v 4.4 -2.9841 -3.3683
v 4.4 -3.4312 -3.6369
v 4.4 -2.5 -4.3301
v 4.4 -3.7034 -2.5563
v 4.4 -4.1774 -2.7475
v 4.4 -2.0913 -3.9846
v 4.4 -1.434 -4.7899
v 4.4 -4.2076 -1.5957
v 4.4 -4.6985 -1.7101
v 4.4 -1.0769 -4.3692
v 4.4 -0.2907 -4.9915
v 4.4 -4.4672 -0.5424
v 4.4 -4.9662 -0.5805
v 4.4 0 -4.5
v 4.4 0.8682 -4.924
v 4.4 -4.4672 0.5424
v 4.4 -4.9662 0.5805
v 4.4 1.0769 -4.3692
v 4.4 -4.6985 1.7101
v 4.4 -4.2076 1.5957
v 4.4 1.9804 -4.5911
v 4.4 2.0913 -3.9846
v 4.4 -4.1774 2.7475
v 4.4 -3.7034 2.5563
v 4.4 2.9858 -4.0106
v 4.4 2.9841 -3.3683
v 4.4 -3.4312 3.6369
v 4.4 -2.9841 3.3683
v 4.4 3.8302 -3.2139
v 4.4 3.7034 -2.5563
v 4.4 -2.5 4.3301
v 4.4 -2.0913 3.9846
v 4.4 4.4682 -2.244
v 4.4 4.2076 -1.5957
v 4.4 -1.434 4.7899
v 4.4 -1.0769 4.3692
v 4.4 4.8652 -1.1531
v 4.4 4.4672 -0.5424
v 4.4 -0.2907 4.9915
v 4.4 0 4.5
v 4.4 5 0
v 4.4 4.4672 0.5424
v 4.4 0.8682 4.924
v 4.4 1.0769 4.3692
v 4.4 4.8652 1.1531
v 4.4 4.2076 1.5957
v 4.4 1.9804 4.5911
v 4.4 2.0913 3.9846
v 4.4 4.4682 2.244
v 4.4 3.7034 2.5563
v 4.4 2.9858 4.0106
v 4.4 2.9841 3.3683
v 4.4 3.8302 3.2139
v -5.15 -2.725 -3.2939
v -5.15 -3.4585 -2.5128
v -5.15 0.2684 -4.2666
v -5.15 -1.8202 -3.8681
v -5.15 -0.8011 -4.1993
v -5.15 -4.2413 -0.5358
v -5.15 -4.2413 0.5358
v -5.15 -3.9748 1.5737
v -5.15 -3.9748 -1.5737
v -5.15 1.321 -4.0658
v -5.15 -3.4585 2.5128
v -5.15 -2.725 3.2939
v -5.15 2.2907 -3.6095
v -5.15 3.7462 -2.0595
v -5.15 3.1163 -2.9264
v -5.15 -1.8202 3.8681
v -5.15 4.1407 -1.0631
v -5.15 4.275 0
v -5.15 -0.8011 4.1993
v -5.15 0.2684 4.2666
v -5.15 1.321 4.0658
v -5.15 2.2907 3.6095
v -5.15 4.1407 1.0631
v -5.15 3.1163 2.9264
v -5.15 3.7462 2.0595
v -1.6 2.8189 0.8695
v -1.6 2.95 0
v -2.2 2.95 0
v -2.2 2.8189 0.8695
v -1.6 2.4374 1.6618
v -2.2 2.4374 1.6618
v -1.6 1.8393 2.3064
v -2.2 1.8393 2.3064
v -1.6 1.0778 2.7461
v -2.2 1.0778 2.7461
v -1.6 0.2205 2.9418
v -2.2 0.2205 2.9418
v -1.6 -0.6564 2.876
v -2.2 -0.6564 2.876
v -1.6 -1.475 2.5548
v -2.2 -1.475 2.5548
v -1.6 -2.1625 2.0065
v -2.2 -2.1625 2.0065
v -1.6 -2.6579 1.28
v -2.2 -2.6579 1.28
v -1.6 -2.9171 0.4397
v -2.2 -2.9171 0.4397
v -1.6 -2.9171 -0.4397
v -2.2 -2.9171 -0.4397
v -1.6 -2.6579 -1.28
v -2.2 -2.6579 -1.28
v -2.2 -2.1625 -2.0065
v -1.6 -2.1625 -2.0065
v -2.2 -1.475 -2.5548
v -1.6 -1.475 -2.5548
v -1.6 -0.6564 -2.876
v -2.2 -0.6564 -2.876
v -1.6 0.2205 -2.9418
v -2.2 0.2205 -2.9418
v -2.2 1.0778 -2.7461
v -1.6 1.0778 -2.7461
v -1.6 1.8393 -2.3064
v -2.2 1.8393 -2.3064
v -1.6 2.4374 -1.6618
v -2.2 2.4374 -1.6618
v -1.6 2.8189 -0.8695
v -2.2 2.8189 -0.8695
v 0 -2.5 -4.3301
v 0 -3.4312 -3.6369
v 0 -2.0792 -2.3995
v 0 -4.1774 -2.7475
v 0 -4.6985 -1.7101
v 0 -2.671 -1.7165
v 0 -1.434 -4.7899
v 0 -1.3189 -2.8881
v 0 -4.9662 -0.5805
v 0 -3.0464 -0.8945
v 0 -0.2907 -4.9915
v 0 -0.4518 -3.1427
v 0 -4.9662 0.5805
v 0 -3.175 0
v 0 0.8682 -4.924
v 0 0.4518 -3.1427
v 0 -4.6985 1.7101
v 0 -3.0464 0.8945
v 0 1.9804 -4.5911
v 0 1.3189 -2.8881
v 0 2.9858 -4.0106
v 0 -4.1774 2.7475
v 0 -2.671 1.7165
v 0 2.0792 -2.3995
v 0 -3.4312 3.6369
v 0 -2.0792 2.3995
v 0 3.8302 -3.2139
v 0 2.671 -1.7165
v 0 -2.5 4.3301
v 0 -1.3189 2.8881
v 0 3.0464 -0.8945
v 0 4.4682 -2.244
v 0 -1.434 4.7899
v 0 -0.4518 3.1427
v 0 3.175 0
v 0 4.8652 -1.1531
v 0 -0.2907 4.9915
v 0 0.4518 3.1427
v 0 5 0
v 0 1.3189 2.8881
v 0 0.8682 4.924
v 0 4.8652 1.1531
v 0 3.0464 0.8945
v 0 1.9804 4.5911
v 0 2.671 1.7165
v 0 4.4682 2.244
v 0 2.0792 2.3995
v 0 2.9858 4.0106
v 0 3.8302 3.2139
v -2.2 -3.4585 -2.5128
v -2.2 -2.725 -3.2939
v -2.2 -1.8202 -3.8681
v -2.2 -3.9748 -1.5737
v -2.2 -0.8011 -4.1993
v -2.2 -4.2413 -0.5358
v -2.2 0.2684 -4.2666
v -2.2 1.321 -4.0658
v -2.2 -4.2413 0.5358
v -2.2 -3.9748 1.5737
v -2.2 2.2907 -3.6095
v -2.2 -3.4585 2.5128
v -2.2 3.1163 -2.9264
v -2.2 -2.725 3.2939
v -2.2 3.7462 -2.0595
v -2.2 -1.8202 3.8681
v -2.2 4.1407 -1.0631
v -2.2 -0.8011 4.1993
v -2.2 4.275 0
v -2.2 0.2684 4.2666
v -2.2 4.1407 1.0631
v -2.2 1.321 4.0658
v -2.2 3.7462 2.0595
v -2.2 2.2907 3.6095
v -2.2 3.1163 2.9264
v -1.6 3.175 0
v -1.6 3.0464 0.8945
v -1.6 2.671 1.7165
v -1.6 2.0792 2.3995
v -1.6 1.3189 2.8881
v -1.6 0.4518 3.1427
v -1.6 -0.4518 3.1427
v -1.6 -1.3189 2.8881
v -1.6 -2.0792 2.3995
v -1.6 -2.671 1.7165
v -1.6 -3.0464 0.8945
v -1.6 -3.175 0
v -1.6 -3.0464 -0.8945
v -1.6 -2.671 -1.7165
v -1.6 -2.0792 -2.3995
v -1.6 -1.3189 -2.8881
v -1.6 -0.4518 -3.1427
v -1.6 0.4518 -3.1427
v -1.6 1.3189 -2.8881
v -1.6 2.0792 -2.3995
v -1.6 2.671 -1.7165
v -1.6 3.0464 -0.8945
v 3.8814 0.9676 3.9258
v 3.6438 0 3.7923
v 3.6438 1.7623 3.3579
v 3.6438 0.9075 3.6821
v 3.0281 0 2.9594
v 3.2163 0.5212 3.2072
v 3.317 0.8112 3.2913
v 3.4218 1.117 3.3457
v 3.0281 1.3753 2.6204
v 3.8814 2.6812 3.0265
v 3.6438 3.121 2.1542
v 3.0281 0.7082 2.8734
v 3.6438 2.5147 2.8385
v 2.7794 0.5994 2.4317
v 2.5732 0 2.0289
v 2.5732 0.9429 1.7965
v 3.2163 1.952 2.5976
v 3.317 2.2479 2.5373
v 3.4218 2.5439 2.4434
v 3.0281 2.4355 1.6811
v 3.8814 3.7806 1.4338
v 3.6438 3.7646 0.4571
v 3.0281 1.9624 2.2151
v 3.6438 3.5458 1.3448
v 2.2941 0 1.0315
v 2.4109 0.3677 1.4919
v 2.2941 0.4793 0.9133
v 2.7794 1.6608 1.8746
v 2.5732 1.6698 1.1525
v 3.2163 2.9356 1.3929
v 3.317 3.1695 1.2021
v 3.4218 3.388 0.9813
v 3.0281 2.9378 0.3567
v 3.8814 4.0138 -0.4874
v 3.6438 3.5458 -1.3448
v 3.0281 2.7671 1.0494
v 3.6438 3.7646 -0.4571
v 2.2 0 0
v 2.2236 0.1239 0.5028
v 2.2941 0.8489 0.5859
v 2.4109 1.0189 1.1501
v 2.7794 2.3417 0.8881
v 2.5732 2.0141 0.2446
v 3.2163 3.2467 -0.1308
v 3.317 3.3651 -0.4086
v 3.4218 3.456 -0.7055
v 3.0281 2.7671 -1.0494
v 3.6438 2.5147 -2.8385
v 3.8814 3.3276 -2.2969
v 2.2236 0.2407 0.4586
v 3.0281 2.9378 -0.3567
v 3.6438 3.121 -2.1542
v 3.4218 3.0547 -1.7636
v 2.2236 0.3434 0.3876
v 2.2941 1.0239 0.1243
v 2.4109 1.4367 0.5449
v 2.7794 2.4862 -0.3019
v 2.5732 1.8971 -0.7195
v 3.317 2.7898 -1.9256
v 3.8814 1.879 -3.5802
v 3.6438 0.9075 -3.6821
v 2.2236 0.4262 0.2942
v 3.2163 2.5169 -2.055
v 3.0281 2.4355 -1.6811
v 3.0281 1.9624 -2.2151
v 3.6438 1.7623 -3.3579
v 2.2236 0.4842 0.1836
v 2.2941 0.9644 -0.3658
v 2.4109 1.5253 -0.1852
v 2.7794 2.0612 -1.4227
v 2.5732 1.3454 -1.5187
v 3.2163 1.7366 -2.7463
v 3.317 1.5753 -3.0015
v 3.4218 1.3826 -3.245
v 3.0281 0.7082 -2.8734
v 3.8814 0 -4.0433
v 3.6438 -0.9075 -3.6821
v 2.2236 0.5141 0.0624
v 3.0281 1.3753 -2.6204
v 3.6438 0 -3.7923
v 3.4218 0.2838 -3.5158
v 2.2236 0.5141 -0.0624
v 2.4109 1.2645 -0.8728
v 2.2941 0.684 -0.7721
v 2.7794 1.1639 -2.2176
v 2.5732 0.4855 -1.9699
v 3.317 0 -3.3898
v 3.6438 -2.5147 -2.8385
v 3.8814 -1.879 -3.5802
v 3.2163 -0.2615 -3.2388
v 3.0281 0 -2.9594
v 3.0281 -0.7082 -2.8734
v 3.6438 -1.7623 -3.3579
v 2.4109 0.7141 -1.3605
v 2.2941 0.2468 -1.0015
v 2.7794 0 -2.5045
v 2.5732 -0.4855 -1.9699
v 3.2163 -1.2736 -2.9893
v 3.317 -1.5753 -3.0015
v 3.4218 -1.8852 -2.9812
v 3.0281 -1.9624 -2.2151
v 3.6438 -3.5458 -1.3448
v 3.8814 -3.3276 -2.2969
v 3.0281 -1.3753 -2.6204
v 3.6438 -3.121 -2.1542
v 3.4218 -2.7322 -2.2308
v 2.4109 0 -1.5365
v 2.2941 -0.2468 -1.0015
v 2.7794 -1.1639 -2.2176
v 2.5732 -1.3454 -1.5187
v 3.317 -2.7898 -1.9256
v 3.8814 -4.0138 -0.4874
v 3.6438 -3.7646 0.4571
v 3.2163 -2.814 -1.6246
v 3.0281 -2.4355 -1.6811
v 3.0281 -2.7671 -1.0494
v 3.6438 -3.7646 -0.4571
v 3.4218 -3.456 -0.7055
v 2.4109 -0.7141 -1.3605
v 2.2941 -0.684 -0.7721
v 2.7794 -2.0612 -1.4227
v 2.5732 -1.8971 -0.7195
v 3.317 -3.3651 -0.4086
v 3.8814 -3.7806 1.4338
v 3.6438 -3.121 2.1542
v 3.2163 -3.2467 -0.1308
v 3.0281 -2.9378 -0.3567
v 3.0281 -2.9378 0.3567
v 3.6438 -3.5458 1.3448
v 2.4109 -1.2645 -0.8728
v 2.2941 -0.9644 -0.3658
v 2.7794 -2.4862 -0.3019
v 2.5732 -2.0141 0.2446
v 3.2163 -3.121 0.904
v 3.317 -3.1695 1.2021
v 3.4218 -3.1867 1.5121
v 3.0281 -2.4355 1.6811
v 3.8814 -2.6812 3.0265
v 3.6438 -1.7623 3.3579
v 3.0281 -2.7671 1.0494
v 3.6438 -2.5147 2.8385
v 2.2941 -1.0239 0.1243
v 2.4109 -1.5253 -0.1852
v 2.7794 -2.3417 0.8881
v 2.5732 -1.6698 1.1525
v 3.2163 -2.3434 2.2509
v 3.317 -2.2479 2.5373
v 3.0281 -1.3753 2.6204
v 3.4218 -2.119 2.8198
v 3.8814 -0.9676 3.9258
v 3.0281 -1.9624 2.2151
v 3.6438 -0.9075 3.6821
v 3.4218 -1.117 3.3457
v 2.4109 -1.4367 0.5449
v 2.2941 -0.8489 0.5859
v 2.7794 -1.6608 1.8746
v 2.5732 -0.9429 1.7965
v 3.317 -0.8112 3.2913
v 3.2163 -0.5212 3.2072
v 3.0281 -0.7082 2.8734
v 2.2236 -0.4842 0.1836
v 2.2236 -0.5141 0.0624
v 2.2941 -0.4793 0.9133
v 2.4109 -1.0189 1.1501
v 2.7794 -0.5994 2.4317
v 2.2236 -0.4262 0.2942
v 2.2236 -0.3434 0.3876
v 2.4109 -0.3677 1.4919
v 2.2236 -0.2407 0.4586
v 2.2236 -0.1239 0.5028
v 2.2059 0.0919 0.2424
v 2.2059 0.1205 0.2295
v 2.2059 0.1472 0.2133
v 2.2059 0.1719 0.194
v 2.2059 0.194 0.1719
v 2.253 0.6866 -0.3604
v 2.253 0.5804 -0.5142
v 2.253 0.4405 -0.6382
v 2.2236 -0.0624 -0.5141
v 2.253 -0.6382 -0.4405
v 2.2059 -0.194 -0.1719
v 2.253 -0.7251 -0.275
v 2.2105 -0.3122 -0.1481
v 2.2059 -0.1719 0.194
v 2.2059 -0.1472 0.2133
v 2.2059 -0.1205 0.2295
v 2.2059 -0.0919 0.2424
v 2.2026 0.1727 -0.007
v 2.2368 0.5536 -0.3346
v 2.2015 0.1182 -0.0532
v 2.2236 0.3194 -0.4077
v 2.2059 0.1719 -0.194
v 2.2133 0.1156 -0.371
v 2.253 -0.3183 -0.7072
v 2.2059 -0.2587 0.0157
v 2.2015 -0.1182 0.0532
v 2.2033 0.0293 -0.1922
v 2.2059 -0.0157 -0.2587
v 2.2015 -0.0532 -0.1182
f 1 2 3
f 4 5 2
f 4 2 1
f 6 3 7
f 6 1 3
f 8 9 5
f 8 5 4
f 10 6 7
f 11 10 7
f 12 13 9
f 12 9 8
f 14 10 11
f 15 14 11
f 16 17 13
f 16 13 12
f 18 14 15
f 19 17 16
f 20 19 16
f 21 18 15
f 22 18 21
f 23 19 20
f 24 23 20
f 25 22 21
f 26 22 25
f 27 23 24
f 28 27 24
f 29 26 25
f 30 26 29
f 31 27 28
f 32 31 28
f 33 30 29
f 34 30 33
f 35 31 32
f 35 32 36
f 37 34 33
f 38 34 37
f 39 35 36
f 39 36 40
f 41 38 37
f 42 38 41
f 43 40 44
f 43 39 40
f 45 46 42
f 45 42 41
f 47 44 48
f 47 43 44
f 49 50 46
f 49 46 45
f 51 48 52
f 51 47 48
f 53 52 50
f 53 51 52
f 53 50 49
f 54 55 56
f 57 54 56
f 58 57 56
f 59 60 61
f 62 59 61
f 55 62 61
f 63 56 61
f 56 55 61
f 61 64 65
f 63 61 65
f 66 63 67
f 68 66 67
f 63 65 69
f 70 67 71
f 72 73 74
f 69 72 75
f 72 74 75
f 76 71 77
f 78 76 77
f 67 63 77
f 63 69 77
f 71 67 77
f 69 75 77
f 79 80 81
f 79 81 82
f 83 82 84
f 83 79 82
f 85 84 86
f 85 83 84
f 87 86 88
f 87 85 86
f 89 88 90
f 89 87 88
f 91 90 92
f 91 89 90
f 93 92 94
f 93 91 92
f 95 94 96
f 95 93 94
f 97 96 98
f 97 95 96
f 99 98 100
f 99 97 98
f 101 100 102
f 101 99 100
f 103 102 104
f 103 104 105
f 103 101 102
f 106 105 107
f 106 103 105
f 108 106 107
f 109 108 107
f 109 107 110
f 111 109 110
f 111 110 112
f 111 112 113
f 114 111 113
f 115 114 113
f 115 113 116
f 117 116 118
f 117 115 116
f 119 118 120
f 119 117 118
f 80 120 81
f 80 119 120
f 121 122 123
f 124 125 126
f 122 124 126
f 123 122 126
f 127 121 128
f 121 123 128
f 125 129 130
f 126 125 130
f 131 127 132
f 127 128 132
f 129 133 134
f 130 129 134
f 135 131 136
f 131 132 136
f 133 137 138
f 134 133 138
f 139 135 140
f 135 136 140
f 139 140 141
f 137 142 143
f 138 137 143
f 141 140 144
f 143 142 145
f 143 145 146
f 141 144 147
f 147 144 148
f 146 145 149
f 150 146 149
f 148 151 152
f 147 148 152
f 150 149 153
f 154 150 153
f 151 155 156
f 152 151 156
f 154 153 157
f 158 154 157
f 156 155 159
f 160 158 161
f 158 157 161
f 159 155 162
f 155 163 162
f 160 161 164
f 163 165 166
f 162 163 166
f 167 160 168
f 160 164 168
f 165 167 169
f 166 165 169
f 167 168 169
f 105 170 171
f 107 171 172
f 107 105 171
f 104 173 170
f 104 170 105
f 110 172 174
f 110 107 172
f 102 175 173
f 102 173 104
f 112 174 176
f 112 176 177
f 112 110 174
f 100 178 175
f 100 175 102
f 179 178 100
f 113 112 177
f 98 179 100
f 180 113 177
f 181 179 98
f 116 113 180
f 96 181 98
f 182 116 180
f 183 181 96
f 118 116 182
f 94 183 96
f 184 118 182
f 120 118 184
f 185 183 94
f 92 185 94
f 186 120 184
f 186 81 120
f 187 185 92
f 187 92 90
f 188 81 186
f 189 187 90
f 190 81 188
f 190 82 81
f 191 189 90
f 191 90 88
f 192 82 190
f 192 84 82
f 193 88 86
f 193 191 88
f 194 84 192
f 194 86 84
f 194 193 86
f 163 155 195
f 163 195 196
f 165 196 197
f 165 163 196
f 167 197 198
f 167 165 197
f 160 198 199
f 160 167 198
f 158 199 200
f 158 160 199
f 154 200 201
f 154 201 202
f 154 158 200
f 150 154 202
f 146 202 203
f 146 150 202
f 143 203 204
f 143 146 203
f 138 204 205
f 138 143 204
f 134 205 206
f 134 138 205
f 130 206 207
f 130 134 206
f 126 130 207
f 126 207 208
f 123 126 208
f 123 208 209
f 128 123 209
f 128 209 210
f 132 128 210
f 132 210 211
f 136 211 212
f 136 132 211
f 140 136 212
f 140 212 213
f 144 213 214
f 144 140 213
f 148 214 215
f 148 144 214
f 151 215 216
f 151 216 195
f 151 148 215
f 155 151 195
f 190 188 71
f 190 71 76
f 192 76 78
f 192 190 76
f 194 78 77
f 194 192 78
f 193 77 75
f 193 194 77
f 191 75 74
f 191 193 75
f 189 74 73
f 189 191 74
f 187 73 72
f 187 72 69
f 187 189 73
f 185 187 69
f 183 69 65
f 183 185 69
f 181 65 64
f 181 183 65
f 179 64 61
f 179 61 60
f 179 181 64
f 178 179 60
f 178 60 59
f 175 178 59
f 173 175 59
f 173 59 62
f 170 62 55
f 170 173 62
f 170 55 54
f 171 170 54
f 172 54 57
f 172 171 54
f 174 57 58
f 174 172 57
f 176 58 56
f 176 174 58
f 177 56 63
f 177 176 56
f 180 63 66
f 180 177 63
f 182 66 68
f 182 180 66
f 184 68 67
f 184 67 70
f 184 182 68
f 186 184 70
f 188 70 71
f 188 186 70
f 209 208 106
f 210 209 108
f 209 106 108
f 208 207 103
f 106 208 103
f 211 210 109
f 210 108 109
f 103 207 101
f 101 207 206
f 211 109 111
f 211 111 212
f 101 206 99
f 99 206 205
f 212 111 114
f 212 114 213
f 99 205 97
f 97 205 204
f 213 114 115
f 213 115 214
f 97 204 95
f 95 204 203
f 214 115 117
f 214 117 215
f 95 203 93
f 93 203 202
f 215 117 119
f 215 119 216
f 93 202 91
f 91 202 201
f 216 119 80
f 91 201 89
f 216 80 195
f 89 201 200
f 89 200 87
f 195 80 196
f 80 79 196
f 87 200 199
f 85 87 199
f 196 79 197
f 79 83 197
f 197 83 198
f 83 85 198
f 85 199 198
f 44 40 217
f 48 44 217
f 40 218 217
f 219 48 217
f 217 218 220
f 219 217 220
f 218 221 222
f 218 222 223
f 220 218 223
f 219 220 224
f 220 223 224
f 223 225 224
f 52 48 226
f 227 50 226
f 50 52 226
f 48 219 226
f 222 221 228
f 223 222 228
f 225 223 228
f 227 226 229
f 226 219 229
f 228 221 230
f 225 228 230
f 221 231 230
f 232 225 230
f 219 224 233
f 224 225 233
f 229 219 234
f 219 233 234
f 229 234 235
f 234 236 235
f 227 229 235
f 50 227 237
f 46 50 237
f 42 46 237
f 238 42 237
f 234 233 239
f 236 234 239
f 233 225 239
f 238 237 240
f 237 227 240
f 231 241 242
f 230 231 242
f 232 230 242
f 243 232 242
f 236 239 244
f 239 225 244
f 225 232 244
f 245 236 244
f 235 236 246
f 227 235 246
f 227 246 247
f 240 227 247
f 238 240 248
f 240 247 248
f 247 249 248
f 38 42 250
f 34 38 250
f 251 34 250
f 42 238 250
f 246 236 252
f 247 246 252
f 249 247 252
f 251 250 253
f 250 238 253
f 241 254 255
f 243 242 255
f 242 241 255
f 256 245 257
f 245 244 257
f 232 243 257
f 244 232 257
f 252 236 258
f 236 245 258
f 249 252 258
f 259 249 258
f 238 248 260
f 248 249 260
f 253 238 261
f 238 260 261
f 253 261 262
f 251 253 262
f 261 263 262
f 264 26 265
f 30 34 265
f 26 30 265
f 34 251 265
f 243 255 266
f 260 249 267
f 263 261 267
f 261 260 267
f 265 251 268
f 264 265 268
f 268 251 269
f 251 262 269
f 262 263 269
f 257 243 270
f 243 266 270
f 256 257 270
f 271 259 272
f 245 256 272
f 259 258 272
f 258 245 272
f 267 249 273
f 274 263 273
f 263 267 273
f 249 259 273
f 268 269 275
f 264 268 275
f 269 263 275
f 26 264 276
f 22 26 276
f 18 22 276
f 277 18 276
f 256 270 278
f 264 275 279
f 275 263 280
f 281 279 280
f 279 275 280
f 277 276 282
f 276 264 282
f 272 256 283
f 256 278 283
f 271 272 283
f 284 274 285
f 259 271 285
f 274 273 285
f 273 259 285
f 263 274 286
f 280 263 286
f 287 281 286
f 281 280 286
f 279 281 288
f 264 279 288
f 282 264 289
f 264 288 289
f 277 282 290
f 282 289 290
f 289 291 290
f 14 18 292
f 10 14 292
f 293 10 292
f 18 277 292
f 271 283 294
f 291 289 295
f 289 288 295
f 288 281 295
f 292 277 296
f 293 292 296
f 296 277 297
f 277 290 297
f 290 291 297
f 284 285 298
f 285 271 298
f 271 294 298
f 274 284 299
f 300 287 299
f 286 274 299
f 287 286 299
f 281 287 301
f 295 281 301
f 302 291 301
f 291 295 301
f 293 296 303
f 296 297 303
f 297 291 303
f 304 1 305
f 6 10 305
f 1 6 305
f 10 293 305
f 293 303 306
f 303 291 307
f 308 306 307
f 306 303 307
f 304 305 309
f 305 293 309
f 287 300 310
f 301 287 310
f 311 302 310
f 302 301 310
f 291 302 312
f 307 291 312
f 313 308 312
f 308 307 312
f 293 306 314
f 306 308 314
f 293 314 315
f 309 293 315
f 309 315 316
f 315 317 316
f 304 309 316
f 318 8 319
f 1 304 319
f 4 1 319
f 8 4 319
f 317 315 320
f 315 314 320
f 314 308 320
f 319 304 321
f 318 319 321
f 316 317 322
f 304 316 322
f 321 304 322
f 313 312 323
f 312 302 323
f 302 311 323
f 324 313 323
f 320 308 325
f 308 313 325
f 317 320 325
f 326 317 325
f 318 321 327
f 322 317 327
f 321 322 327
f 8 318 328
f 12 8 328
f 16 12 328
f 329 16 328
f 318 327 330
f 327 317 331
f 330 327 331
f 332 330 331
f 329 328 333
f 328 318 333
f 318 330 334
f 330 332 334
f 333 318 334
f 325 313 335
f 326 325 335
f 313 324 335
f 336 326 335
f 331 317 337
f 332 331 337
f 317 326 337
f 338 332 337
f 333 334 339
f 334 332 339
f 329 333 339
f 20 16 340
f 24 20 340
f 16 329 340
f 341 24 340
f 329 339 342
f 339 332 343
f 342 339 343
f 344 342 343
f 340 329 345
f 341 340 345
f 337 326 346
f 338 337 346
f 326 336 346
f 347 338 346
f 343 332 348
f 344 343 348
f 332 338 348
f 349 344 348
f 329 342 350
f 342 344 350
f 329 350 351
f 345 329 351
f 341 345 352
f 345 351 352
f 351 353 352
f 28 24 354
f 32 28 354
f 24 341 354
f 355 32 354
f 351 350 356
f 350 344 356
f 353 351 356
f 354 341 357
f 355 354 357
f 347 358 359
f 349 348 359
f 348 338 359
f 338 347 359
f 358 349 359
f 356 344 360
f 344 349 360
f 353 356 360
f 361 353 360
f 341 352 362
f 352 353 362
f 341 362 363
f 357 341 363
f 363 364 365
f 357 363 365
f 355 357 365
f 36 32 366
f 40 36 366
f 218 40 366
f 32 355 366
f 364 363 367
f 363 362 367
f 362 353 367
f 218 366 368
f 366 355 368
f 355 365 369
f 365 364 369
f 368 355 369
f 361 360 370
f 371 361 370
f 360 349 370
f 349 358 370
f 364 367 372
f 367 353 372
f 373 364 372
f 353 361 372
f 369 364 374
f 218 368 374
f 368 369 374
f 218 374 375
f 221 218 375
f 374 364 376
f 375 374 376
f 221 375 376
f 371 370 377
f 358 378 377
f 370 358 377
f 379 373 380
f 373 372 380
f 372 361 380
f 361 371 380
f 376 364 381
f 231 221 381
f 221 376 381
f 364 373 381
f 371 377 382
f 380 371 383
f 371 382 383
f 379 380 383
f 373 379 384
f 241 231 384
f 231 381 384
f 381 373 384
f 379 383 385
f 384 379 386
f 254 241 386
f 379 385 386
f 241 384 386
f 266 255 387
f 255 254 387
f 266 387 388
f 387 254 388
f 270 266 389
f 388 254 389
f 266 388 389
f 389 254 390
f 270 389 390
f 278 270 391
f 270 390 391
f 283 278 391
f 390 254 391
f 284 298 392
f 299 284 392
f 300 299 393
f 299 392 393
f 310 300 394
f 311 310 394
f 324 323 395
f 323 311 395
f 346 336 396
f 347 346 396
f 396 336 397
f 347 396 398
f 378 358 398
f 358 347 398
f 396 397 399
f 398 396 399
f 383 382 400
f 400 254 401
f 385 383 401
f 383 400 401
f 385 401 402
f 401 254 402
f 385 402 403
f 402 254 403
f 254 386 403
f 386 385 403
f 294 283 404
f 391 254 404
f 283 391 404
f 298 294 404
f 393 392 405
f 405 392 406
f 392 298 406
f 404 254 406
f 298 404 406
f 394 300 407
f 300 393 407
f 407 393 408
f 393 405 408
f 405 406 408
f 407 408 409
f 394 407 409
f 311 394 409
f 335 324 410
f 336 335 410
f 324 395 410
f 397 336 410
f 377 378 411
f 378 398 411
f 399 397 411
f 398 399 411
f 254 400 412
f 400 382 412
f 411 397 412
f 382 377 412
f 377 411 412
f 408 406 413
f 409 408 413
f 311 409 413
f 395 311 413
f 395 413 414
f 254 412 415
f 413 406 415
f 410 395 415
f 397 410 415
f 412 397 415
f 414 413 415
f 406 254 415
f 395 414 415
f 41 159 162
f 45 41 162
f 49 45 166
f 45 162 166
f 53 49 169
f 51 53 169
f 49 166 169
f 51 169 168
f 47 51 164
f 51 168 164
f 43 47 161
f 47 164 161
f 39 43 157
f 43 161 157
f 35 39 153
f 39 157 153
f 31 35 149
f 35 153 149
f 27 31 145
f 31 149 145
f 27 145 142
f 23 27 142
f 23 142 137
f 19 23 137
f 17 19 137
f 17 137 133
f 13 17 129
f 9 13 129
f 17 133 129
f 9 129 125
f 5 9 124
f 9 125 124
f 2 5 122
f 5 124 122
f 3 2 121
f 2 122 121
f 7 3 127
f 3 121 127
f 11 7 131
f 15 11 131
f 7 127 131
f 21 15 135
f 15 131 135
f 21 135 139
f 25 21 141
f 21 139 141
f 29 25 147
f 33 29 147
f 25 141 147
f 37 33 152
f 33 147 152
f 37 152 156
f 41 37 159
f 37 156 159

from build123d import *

# Parameters (mm, degrees)
F0_R     = 5
F1_DEPTH = 4.4
F2_R     = 3.175
F3_DEPTH = 1.6
F5_R     = 2.95
F6_DEPTH = 0.6
F8_R     = 4.275
F9_DEPTH = 2.95


with BuildPart() as f1:
    # F0 (on Right) → F1 (new body)
    with BuildSketch(Plane.YZ):
        Circle(F0_R)
    extrude(amount=F1_DEPTH)

    # F2 (on Right) → F3 (join)
    with BuildSketch(Plane.YZ):
        Circle(F2_R)
    extrude(amount=-F3_DEPTH)

    # F5 (on offset) → F6 (join)
    with BuildSketch(Plane.YZ.offset(-1.6)):
        Circle(F5_R)
    extrude(amount=-F6_DEPTH)

    # F8 (on offset) → F9 (join)
    with BuildSketch(Plane.YZ.offset(-2.2)):
        Circle(F8_R)
    extrude(amount=-F9_DEPTH)

    # F10 (on Front) → F11 (revolve, cut)
    with BuildSketch(Plane.XZ):
        with BuildLine():
            Line((4.4, 0), (4.4, 4.5))
            ThreePointArc((4.4, 4.5), (2.77944, 2.504496), (2.2, 0))
            Line((2.2, 0), (4.4, 0))
        make_face()
    revolve(axis=Axis((3.3, 0, 0), (-1, 0, 0)), mode=Mode.SUBTRACT)


solid = f1.part
